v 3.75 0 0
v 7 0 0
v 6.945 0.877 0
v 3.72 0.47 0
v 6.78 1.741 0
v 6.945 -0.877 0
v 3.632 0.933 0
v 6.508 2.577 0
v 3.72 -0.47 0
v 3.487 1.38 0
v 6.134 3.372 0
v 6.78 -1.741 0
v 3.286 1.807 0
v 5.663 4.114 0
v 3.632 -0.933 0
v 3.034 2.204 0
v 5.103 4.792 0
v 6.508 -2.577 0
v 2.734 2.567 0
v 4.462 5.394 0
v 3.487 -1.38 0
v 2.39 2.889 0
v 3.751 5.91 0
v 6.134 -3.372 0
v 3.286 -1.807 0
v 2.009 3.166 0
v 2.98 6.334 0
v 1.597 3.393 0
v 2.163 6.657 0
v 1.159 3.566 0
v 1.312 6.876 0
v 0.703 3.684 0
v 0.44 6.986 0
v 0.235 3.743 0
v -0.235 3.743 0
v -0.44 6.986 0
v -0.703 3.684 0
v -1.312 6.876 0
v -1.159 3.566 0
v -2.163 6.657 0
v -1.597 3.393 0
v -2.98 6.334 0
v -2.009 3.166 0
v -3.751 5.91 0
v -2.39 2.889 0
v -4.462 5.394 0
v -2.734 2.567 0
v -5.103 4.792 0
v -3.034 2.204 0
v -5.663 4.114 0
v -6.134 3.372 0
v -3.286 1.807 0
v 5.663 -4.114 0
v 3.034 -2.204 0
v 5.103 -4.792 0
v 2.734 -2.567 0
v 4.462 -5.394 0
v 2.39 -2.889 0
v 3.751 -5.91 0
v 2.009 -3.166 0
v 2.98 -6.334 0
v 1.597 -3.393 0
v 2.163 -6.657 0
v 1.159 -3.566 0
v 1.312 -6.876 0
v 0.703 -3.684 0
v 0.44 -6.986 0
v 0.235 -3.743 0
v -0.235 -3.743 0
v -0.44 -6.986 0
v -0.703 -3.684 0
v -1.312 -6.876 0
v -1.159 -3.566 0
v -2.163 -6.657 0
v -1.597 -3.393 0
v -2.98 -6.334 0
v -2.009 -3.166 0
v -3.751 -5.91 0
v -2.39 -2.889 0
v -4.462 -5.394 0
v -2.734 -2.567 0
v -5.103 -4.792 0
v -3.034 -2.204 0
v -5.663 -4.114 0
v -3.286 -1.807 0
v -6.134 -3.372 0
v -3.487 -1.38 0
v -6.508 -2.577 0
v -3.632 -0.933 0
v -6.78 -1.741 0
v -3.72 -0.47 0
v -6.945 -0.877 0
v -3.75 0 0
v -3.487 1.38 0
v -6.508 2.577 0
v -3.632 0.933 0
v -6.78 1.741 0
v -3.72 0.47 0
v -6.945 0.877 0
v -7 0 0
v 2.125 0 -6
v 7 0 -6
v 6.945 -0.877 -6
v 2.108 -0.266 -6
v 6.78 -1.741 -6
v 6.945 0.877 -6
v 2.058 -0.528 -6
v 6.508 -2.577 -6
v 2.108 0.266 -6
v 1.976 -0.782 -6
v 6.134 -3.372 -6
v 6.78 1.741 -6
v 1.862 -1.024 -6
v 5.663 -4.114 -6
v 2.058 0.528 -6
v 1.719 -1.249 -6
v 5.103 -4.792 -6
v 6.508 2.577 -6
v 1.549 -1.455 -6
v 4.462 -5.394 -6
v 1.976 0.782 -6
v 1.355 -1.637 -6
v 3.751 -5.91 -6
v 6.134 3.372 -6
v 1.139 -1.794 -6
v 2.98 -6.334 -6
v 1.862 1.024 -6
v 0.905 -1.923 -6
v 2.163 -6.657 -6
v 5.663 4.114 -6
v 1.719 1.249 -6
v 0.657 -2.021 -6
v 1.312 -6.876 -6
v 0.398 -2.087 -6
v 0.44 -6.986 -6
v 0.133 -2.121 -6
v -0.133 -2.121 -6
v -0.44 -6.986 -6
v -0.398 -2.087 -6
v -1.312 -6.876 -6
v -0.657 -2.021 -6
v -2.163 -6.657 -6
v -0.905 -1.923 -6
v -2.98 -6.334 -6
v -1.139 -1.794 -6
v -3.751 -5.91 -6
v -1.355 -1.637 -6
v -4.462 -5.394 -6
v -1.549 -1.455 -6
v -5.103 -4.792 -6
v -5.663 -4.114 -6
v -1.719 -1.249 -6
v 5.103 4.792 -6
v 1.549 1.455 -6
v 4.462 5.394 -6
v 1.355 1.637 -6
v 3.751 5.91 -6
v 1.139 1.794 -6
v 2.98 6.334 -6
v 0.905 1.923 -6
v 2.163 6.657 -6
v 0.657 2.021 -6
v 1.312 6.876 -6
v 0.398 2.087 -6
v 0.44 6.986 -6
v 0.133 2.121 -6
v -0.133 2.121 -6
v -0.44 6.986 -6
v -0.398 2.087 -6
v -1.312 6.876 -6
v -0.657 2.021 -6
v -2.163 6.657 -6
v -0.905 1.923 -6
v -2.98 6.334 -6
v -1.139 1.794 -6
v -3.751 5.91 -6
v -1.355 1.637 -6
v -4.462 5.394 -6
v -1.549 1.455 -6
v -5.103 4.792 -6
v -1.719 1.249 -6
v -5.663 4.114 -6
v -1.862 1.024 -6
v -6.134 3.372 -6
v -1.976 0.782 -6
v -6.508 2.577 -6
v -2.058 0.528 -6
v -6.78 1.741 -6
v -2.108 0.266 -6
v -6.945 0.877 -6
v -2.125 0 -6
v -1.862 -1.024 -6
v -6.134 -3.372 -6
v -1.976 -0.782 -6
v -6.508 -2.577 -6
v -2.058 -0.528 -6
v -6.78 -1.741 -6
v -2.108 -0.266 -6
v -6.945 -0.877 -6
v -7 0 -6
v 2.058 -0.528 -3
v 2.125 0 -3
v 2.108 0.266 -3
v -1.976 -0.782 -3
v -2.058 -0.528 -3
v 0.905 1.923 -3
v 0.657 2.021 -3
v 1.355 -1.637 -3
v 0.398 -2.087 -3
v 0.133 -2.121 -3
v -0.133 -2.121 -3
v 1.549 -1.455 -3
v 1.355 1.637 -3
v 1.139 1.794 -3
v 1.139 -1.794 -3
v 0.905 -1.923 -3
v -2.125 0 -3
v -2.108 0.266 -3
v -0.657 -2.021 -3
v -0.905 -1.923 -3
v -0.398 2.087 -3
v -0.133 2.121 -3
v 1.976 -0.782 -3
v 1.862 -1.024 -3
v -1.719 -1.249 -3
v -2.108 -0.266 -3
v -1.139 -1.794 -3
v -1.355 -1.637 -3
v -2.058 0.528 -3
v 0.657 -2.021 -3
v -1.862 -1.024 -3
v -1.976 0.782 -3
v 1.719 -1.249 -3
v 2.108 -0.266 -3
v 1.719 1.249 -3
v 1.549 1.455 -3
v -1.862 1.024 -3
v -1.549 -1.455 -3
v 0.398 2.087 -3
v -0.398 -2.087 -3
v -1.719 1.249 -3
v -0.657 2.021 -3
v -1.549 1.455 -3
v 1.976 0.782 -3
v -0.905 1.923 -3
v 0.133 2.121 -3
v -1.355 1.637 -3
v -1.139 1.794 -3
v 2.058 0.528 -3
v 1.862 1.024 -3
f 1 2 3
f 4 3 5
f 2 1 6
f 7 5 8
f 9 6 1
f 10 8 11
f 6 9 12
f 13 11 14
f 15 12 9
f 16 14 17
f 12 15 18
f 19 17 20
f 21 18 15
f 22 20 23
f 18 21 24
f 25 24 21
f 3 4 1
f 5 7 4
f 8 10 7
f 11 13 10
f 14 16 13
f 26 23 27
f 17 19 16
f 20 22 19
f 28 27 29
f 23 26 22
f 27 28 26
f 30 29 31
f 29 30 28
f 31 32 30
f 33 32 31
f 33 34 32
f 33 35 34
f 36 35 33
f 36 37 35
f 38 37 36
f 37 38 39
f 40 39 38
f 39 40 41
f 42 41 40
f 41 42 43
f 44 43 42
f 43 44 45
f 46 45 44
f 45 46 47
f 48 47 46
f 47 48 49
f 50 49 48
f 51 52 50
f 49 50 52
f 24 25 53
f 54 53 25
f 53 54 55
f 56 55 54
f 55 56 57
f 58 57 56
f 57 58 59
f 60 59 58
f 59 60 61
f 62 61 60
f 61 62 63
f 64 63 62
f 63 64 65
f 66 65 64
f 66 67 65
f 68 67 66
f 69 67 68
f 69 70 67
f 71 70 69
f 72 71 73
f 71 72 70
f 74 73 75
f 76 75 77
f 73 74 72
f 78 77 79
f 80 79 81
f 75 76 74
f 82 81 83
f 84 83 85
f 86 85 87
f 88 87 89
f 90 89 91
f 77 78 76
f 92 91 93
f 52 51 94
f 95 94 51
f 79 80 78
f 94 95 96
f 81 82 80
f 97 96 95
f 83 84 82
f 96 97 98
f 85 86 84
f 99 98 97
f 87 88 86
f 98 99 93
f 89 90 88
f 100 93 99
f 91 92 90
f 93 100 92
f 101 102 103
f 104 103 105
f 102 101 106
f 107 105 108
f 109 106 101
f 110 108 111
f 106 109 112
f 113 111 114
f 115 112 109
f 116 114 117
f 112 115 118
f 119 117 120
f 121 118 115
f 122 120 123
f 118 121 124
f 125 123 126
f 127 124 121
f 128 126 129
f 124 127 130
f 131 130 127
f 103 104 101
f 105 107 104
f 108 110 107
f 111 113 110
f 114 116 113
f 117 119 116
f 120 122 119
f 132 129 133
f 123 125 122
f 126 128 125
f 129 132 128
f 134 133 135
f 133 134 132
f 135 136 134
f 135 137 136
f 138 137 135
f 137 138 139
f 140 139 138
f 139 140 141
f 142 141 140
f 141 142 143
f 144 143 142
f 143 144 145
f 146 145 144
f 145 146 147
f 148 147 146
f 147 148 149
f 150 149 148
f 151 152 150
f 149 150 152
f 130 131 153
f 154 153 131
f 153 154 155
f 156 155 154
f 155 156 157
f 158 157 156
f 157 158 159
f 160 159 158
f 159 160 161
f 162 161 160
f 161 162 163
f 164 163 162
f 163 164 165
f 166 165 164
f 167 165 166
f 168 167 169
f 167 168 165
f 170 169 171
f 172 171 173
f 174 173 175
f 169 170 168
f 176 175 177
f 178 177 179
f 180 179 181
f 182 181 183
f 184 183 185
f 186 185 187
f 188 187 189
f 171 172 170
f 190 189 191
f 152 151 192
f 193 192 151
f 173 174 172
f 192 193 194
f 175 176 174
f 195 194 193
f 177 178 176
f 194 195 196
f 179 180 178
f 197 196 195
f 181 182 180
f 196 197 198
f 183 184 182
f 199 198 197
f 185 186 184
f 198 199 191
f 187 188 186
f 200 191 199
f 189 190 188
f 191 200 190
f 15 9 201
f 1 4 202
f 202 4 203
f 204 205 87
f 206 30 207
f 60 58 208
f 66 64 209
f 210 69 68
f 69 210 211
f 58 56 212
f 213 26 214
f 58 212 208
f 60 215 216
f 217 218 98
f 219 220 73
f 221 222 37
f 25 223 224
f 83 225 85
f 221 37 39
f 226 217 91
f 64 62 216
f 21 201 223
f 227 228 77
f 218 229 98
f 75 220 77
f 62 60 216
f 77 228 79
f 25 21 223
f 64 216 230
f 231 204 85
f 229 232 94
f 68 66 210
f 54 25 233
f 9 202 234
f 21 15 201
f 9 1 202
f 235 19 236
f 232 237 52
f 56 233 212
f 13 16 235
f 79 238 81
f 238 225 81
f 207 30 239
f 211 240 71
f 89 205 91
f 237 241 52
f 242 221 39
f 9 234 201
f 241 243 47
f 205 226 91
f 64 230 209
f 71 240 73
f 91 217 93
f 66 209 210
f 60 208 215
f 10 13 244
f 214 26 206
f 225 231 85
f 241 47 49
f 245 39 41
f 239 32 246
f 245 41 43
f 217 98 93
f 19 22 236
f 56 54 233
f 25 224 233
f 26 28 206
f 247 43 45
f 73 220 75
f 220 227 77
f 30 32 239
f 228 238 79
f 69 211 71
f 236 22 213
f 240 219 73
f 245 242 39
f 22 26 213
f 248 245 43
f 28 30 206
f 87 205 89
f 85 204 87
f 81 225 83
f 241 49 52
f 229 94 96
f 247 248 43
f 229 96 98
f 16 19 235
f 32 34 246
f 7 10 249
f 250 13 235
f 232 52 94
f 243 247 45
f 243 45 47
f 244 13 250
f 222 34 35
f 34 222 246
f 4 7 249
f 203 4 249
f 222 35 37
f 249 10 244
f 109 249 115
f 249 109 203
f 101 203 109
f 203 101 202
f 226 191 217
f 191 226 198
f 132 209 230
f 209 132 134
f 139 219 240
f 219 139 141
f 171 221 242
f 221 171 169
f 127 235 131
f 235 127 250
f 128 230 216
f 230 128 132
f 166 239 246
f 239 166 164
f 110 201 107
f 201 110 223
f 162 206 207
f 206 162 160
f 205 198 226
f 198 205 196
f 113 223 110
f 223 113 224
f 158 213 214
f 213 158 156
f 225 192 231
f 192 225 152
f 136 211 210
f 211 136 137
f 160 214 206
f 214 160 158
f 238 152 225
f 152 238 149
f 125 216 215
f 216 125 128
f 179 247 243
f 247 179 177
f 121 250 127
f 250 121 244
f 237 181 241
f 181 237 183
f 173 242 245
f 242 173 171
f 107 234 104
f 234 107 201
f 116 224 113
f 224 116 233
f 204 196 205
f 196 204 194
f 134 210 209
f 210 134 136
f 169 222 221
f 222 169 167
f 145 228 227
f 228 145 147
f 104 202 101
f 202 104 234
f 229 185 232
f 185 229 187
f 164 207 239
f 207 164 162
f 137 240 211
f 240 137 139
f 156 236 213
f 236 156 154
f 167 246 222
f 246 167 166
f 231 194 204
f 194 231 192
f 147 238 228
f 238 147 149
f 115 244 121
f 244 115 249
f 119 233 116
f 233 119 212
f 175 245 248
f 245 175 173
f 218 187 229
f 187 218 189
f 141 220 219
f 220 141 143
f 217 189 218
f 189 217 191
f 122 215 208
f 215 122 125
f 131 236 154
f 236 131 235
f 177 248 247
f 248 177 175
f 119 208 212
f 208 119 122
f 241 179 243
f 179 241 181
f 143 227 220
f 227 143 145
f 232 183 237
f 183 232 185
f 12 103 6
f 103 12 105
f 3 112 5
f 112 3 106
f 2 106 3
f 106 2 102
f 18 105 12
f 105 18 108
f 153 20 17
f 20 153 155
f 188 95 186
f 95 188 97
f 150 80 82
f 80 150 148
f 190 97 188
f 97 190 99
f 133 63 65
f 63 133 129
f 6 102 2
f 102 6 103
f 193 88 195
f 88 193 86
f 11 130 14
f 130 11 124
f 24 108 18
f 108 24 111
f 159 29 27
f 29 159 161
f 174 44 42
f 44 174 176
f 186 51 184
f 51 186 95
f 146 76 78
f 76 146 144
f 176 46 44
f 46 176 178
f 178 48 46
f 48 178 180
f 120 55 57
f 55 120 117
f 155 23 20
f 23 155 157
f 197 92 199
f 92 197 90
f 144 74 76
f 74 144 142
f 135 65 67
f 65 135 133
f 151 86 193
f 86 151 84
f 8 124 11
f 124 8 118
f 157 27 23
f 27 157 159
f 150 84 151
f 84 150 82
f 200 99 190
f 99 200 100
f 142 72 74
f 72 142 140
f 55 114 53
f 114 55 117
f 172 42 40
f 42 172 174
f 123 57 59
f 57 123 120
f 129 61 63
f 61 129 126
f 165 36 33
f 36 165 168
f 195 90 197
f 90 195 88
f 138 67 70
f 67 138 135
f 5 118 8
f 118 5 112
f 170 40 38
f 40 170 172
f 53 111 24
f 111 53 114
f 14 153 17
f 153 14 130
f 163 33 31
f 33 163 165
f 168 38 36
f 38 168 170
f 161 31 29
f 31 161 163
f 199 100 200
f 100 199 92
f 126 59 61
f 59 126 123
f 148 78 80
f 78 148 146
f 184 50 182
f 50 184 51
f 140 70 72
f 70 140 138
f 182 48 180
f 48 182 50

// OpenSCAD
$fn = 50;


difference() {
	union() {
		translate(v = [0, 0, -6.0000000000]) {
			cylinder(h = 6, r = 7.0000000000);
		}
		cylinder(h = 0, r = 13.0000000000);
	}
	union() {
		translate(v = [0, 0, 0]) {
			rotate(a = [0, 0, 0]) {
				difference() {
					union() {
						#translate(v = [0, 0, -6.0000000000]) {
							cylinder(h = 6, r = 2.0000000000);
						}
						#translate(v = [0, 0, -3]) {
							cylinder(h = 3, r = 7.0000000000, r1 = 2.1250000000, r2 = 3.7500000000);
						}
						#translate(v = [0, 0, -6.0000000000]) {
							cylinder(h = 6, r = 2.1250000000);
						}
						#translate(v = [0, 0, -6.0000000000]) {
							cylinder(h = 6, r = 2.0000000000);
						}
					}
					union();
				}
			}
		}
	}
}
